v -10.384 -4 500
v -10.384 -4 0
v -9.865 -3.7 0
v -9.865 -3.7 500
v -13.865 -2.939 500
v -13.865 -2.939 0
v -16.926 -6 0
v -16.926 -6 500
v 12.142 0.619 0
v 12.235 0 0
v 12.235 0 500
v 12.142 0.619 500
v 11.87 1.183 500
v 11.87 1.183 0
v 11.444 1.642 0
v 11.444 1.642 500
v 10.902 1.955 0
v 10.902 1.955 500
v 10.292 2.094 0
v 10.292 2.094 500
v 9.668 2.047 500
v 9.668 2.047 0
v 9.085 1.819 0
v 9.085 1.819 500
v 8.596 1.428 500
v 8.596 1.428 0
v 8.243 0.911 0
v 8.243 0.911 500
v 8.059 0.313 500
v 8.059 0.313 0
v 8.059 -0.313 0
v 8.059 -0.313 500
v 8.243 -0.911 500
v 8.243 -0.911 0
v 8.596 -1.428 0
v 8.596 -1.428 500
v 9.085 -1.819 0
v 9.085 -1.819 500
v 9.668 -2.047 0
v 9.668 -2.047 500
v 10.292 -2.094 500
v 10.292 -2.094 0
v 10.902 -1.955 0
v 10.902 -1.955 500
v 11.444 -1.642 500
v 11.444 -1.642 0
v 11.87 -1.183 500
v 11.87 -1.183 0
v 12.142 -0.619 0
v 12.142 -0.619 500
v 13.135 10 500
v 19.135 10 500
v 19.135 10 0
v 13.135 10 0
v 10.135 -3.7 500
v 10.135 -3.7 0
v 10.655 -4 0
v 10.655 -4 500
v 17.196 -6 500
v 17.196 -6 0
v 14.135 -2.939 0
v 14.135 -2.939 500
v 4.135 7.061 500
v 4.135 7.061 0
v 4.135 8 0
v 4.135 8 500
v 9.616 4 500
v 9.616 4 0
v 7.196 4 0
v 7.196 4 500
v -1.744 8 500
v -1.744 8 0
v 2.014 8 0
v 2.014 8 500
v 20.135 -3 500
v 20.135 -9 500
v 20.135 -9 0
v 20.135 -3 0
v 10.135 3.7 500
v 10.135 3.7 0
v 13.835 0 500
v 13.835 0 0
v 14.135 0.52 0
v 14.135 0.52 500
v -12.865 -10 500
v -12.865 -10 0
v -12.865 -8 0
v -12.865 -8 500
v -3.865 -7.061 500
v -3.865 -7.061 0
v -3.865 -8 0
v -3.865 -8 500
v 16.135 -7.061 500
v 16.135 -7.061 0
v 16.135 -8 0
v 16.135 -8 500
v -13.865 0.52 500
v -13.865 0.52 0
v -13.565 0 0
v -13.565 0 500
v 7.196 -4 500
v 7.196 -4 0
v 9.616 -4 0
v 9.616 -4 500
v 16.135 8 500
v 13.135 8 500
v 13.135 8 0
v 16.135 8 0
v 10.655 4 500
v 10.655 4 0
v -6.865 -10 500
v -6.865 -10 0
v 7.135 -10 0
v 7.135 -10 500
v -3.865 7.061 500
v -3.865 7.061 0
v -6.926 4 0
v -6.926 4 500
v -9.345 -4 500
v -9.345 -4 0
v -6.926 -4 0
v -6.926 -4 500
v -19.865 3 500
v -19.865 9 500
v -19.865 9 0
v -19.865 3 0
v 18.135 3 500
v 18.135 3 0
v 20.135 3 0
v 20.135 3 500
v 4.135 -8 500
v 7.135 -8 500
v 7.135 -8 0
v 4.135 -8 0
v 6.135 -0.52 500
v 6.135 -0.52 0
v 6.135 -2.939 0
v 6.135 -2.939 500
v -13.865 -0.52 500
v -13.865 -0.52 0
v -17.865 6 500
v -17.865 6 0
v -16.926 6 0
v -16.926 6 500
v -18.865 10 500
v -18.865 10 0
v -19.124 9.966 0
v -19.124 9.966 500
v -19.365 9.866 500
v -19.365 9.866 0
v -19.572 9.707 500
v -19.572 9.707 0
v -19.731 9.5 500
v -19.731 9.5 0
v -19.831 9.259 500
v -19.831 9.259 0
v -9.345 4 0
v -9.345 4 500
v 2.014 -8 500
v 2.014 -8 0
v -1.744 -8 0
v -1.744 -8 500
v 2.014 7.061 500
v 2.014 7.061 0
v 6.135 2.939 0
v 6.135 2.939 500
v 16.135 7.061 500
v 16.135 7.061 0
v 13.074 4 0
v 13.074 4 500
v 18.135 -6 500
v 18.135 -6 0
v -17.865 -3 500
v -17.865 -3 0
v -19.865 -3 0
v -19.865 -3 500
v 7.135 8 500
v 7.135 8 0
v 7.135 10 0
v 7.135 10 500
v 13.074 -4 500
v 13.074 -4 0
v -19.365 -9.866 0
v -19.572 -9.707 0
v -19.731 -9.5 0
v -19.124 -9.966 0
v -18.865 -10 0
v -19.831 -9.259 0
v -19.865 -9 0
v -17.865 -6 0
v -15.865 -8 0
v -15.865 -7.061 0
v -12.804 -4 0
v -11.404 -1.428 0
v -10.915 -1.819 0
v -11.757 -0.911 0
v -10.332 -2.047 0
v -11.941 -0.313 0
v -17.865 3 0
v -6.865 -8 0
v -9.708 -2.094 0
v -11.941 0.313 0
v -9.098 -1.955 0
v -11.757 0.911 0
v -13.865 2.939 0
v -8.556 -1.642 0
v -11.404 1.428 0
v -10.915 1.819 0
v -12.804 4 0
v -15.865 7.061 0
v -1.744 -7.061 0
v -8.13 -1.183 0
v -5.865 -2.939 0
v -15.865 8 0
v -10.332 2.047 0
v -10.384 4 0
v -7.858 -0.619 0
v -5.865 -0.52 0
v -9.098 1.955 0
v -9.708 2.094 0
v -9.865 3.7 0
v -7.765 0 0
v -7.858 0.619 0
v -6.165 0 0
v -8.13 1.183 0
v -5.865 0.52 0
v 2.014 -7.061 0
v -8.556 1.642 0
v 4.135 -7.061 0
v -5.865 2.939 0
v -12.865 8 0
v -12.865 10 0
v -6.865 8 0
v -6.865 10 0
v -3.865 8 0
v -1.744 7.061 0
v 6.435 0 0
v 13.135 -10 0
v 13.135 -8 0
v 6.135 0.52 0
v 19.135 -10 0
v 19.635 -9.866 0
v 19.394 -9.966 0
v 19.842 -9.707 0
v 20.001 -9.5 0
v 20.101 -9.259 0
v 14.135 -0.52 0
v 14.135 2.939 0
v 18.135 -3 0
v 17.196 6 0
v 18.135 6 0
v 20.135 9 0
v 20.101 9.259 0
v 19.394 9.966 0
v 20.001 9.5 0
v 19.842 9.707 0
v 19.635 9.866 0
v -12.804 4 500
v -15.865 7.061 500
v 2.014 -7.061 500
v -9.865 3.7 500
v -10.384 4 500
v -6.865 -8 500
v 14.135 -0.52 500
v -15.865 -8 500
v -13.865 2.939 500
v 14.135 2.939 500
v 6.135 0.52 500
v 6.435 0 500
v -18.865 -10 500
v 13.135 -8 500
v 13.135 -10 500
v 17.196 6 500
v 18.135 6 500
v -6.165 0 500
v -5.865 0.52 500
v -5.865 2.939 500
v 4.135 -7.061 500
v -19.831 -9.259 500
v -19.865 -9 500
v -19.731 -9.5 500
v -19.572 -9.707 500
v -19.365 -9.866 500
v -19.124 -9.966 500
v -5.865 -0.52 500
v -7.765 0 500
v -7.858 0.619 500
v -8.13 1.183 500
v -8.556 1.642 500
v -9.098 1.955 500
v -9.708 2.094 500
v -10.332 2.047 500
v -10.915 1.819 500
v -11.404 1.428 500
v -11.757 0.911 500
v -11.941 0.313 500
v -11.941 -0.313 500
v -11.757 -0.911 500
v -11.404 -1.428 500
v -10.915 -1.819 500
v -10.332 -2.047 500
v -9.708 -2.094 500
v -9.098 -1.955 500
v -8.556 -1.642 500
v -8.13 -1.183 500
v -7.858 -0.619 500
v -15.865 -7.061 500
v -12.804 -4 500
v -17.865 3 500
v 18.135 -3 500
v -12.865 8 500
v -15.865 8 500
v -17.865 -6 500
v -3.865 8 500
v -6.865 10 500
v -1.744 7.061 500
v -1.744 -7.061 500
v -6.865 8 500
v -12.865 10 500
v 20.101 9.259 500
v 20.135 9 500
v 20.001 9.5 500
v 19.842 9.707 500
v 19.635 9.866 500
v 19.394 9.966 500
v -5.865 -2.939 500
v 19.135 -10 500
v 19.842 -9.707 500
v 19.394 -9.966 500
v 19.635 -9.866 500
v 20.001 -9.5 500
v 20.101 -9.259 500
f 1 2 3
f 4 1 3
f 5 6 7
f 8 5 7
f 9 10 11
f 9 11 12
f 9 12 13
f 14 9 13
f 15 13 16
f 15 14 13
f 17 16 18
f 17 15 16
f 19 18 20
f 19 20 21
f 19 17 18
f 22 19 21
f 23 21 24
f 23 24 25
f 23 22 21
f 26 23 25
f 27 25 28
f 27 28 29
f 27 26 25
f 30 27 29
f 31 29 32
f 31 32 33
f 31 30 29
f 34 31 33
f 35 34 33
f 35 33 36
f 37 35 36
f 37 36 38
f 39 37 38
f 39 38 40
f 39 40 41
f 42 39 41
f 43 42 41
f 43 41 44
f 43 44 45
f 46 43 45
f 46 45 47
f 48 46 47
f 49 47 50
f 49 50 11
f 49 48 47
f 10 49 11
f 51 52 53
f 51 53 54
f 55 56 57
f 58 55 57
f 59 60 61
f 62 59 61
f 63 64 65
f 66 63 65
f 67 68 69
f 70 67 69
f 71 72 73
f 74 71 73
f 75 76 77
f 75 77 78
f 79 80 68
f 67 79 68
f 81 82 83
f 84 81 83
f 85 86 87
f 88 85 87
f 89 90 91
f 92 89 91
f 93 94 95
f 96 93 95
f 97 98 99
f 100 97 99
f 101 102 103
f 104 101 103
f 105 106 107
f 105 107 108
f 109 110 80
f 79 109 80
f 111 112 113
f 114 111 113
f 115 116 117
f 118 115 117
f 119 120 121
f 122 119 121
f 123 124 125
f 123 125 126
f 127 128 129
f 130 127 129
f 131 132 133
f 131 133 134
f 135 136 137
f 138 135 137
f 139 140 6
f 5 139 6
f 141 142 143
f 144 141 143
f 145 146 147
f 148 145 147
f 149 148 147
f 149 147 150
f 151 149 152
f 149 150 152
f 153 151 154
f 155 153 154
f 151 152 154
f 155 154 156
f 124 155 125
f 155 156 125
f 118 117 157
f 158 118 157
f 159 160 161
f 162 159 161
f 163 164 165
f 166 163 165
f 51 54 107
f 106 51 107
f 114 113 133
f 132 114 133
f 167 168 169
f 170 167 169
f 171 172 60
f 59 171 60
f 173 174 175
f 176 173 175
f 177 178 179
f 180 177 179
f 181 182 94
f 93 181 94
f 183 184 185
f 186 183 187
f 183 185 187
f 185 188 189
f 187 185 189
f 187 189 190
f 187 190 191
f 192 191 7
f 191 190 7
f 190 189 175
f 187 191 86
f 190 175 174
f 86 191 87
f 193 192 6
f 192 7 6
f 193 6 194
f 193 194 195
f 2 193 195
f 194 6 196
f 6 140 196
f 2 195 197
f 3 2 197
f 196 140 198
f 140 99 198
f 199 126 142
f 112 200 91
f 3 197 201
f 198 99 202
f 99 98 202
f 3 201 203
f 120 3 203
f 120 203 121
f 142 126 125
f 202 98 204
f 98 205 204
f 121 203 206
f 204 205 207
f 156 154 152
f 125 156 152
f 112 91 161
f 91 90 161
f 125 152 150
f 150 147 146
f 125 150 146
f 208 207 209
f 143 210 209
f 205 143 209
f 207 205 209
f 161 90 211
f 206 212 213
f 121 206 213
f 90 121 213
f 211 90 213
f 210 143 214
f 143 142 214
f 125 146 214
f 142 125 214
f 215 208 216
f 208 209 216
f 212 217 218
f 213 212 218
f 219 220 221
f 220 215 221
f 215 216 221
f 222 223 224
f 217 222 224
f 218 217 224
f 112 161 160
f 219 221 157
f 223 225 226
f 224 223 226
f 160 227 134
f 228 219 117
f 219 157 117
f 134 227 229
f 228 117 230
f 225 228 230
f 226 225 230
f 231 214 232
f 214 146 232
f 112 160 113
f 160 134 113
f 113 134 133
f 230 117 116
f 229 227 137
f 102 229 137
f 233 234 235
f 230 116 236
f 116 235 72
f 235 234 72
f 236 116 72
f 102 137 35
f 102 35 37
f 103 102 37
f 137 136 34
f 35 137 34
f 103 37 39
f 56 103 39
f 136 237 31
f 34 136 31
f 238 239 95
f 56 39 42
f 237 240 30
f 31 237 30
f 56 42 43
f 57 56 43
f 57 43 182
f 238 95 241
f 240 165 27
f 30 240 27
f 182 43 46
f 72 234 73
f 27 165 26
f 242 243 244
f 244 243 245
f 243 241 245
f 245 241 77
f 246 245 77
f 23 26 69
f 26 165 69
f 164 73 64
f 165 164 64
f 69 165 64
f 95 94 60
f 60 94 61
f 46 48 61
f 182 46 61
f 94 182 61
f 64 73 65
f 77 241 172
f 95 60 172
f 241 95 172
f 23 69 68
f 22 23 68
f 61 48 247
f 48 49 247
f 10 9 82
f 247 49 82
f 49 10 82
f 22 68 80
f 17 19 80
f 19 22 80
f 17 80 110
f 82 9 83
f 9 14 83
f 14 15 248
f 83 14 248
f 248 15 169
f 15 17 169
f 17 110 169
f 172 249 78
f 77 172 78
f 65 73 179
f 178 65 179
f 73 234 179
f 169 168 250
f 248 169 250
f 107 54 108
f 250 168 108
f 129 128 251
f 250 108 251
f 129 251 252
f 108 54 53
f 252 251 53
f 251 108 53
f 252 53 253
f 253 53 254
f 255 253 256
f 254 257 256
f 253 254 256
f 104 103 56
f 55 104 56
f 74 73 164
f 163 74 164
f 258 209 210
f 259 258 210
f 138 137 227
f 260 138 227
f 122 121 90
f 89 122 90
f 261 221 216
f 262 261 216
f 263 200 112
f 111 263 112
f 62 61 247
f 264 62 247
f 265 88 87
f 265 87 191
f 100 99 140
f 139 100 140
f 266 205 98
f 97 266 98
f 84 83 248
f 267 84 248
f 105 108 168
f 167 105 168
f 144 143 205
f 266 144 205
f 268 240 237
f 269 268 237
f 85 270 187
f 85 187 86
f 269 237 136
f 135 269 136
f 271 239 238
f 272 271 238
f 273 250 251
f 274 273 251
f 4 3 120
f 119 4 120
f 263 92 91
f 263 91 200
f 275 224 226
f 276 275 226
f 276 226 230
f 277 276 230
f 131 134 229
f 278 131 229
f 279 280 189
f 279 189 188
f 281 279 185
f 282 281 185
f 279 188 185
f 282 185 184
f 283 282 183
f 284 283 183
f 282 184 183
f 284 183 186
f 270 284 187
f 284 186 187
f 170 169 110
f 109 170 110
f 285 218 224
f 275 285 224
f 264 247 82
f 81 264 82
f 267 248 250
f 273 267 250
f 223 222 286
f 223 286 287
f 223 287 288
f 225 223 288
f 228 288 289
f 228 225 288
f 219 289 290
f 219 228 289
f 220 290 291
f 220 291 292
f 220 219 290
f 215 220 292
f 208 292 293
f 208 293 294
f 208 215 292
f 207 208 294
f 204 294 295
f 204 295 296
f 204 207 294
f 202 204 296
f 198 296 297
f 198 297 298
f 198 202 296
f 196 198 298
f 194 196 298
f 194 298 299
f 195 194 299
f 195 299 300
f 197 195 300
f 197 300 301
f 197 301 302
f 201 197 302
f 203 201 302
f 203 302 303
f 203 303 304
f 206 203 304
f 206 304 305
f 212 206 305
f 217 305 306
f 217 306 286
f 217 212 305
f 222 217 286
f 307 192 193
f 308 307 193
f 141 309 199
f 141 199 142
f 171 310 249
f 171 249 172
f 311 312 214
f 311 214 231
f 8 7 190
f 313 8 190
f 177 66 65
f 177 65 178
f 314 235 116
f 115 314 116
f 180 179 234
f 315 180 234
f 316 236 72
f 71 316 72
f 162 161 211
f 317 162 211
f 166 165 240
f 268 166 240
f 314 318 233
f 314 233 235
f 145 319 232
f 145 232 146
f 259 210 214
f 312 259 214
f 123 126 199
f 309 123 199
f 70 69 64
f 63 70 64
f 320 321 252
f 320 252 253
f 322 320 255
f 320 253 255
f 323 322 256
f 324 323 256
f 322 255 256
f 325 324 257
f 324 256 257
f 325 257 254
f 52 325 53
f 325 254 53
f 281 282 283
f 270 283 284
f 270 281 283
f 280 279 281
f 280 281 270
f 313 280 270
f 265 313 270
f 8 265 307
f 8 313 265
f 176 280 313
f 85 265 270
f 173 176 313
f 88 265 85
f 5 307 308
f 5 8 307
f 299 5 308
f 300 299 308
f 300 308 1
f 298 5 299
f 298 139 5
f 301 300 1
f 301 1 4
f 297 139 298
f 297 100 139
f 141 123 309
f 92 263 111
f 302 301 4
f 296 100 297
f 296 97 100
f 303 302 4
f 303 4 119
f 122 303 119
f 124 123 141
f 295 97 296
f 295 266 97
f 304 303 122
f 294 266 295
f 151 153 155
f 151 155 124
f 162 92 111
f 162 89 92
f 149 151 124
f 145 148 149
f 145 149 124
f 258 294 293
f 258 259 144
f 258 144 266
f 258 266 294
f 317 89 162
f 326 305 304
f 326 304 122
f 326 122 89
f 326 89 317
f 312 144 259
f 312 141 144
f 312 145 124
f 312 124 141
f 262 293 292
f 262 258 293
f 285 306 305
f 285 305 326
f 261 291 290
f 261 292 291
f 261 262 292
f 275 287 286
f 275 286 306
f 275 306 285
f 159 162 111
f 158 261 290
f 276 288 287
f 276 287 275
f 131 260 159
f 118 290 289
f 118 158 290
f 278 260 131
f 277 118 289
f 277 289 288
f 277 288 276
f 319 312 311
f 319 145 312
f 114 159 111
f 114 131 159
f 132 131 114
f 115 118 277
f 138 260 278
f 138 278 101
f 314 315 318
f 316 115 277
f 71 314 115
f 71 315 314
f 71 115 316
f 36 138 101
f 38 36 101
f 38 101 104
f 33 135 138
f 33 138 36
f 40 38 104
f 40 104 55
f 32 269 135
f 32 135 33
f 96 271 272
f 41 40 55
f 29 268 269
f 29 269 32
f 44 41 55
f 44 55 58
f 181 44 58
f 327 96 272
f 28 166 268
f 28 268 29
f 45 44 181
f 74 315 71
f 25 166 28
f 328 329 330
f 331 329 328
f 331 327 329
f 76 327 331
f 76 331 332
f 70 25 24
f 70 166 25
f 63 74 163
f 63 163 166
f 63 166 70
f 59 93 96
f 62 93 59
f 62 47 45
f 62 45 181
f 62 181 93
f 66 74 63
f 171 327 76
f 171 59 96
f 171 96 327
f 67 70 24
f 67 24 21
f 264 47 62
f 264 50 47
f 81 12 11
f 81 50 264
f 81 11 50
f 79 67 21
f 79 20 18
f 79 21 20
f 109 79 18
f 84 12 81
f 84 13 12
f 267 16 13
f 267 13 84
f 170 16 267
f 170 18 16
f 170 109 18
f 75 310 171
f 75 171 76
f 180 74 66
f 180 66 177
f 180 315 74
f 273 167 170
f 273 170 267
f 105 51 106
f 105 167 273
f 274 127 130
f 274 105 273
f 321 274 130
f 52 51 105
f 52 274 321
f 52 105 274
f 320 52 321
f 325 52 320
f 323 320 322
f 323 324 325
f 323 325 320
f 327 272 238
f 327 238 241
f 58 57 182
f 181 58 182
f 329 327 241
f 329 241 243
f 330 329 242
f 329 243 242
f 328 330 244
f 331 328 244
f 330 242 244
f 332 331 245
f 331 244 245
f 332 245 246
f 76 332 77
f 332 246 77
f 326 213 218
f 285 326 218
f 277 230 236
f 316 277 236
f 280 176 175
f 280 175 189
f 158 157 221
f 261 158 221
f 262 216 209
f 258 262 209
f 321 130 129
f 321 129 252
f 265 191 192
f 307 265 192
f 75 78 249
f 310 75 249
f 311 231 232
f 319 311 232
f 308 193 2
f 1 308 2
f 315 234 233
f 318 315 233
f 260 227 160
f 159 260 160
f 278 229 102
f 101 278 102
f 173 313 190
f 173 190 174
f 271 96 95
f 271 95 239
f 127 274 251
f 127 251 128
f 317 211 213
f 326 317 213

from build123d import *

# Parameters (mm, degrees)
F0_R     = 2.1
F1_DEPTH = 500


with BuildPart() as f1:
    # F0 (on Top) → F1 (new body)
    with BuildSketch(Plane.XY):
        with BuildLine():
            Line((14.135135, -0.519615), (13.835135, 0))
            Line((13.835135, 0), (14.135135, 0.519615))
            Line((14.135135, 0.519615), (14.135135, 2.93934))
            Line((14.135135, 2.93934), (17.195795, 6))
            Line((17.195795, 6), (18.135135, 6))
            Line((18.135135, 6), (18.135135, 3))
            Line((18.135135, 3), (20.135135, 3))
            Line((20.135135, 3), (20.135135, 9))
            ThreePointArc((20.135135, 9), (19.842242, 9.707107), (19.135135, 10))
            Line((19.135135, 10), (13.135135, 10))
            Line((13.135135, 10), (13.135135, 8))
            Line((13.135135, 8), (16.135135, 8))
            Line((16.135135, 8), (16.135135, 7.06066))
            Line((16.135135, 7.06066), (13.074475, 4))
            Line((13.074475, 4), (10.65475, 4))
            Line((10.65475, 4), (10.135135, 3.7))
            Line((10.135135, 3.7), (9.61552, 4))
            Line((9.61552, 4), (7.195795, 4))
            Line((7.195795, 4), (4.135135, 7.06066))
            Line((4.135135, 7.06066), (4.135135, 8))
            Line((4.135135, 8), (7.135135, 8))
            Line((7.135135, 8), (7.135135, 10))
            Line((7.135135, 10), (-6.864865, 10))
            Line((-6.864865, 10), (-6.864865, 8))
            Line((-6.864865, 8), (-3.864865, 8))
            Line((-3.864865, 8), (-3.864865, 7.06066))
            Line((-3.864865, 7.06066), (-6.925525, 4))
            Line((-6.925525, 4), (-9.34525, 4))
            Line((-9.34525, 4), (-9.864865, 3.7))
            Line((-9.864865, 3.7), (-10.38448, 4))
            Line((-10.38448, 4), (-12.804205, 4))
            Line((-12.804205, 4), (-15.864865, 7.06066))
            Line((-15.864865, 7.06066), (-15.864865, 8))
            Line((-15.864865, 8), (-12.864865, 8))
            Line((-12.864865, 8), (-12.864865, 10))
            Line((-12.864865, 10), (-18.864865, 10))
            ThreePointArc((-18.864865, 10), (-19.571972, 9.707107), (-19.864865, 9))
            Line((-19.864865, 9), (-19.864865, 3))
            Line((-19.864865, 3), (-17.864865, 3))
            Line((-17.864865, 3), (-17.864865, 6))
            Line((-17.864865, 6), (-16.925525, 6))
            Line((-16.925525, 6), (-13.864865, 2.93934))
            Line((-13.864865, 2.93934), (-13.864865, 0.519615))
            Line((-13.864865, 0.519615), (-13.564865, 0))
            Line((-13.564865, 0), (-13.864865, -0.519615))
            Line((-13.864865, -0.519615), (-13.864865, -2.93934))
            Line((-13.864865, -2.93934), (-16.925525, -6))
            Line((-16.925525, -6), (-17.864865, -6))
            Line((-17.864865, -6), (-17.864865, -3))
            Line((-17.864865, -3), (-19.864865, -3))
            Line((-19.864865, -3), (-19.864865, -9))
            ThreePointArc((-19.864865, -9), (-19.571972, -9.707107), (-18.864865, -10))
            Line((-18.864865, -10), (-12.864865, -10))
            Line((-12.864865, -10), (-12.864865, -8))
            Line((-12.864865, -8), (-15.864865, -8))
            Line((-15.864865, -8), (-15.864865, -7.06066))
            Line((-15.864865, -7.06066), (-12.804205, -4))
            Line((-12.804205, -4), (-10.38448, -4))
            Line((-10.38448, -4), (-9.864865, -3.7))
            Line((-9.864865, -3.7), (-9.34525, -4))
            Line((-9.34525, -4), (-6.925525, -4))
            Line((-6.925525, -4), (-3.864865, -7.06066))
            Line((-3.864865, -7.06066), (-3.864865, -8))
            Line((-3.864865, -8), (-6.864865, -8))
            Line((-6.864865, -8), (-6.864865, -10))
            Line((-6.864865, -10), (7.135135, -10))
            Line((7.135135, -10), (7.135135, -8))
            Line((7.135135, -8), (4.135135, -8))
            Line((4.135135, -8), (4.135135, -7.06066))
            Line((4.135135, -7.06066), (7.195795, -4))
            Line((7.195795, -4), (9.61552, -4))
            Line((9.61552, -4), (10.135135, -3.7))
            Line((10.135135, -3.7), (10.65475, -4))
            Line((10.65475, -4), (13.074475, -4))
            Line((13.074475, -4), (16.135135, -7.06066))
            Line((16.135135, -7.06066), (16.135135, -8))
            Line((16.135135, -8), (13.135135, -8))
            Line((13.135135, -8), (13.135135, -10))
            Line((13.135135, -10), (19.135135, -10))
            ThreePointArc((19.135135, -10), (19.842242, -9.707107), (20.135135, -9))
            Line((20.135135, -9), (20.135135, -3))
            Line((20.135135, -3), (18.135135, -3))
            Line((18.135135, -3), (18.135135, -6))
            Line((18.135135, -6), (17.195795, -6))
            Line((17.195795, -6), (14.135135, -2.93934))
            Line((14.135135, -2.93934), (14.135135, -0.519615))
        make_face()
        with Locations((-9.864865, 0)):
            Circle(F0_R, mode=Mode.SUBTRACT)
        Polygon((6.435135, 0), (6.135135, -0.519615), (6.135135, -2.93934), (3.074475, -6), (2.013815, -7.06066), (2.013815, -8), (-1.743545, -8), (-1.743545, -7.06066), (-2.804205, -6), (-5.864865, -2.93934), (-5.864865, -0.519615), (-6.164865, 0), (-5.864865, 0.519615), (-5.864865, 2.93934), (-2.804205, 6), (-1.743545, 7.06066), (-1.743545, 8), (2.013815, 8), (2.013815, 7.06066), (3.074475, 6), (6.135135, 2.93934), (6.135135, 0.519615), align=None, mode=Mode.SUBTRACT)
        with Locations((10.135135, 0)):
            Circle(F0_R, mode=Mode.SUBTRACT)
    extrude(amount=F1_DEPTH)


solid = f1.part
